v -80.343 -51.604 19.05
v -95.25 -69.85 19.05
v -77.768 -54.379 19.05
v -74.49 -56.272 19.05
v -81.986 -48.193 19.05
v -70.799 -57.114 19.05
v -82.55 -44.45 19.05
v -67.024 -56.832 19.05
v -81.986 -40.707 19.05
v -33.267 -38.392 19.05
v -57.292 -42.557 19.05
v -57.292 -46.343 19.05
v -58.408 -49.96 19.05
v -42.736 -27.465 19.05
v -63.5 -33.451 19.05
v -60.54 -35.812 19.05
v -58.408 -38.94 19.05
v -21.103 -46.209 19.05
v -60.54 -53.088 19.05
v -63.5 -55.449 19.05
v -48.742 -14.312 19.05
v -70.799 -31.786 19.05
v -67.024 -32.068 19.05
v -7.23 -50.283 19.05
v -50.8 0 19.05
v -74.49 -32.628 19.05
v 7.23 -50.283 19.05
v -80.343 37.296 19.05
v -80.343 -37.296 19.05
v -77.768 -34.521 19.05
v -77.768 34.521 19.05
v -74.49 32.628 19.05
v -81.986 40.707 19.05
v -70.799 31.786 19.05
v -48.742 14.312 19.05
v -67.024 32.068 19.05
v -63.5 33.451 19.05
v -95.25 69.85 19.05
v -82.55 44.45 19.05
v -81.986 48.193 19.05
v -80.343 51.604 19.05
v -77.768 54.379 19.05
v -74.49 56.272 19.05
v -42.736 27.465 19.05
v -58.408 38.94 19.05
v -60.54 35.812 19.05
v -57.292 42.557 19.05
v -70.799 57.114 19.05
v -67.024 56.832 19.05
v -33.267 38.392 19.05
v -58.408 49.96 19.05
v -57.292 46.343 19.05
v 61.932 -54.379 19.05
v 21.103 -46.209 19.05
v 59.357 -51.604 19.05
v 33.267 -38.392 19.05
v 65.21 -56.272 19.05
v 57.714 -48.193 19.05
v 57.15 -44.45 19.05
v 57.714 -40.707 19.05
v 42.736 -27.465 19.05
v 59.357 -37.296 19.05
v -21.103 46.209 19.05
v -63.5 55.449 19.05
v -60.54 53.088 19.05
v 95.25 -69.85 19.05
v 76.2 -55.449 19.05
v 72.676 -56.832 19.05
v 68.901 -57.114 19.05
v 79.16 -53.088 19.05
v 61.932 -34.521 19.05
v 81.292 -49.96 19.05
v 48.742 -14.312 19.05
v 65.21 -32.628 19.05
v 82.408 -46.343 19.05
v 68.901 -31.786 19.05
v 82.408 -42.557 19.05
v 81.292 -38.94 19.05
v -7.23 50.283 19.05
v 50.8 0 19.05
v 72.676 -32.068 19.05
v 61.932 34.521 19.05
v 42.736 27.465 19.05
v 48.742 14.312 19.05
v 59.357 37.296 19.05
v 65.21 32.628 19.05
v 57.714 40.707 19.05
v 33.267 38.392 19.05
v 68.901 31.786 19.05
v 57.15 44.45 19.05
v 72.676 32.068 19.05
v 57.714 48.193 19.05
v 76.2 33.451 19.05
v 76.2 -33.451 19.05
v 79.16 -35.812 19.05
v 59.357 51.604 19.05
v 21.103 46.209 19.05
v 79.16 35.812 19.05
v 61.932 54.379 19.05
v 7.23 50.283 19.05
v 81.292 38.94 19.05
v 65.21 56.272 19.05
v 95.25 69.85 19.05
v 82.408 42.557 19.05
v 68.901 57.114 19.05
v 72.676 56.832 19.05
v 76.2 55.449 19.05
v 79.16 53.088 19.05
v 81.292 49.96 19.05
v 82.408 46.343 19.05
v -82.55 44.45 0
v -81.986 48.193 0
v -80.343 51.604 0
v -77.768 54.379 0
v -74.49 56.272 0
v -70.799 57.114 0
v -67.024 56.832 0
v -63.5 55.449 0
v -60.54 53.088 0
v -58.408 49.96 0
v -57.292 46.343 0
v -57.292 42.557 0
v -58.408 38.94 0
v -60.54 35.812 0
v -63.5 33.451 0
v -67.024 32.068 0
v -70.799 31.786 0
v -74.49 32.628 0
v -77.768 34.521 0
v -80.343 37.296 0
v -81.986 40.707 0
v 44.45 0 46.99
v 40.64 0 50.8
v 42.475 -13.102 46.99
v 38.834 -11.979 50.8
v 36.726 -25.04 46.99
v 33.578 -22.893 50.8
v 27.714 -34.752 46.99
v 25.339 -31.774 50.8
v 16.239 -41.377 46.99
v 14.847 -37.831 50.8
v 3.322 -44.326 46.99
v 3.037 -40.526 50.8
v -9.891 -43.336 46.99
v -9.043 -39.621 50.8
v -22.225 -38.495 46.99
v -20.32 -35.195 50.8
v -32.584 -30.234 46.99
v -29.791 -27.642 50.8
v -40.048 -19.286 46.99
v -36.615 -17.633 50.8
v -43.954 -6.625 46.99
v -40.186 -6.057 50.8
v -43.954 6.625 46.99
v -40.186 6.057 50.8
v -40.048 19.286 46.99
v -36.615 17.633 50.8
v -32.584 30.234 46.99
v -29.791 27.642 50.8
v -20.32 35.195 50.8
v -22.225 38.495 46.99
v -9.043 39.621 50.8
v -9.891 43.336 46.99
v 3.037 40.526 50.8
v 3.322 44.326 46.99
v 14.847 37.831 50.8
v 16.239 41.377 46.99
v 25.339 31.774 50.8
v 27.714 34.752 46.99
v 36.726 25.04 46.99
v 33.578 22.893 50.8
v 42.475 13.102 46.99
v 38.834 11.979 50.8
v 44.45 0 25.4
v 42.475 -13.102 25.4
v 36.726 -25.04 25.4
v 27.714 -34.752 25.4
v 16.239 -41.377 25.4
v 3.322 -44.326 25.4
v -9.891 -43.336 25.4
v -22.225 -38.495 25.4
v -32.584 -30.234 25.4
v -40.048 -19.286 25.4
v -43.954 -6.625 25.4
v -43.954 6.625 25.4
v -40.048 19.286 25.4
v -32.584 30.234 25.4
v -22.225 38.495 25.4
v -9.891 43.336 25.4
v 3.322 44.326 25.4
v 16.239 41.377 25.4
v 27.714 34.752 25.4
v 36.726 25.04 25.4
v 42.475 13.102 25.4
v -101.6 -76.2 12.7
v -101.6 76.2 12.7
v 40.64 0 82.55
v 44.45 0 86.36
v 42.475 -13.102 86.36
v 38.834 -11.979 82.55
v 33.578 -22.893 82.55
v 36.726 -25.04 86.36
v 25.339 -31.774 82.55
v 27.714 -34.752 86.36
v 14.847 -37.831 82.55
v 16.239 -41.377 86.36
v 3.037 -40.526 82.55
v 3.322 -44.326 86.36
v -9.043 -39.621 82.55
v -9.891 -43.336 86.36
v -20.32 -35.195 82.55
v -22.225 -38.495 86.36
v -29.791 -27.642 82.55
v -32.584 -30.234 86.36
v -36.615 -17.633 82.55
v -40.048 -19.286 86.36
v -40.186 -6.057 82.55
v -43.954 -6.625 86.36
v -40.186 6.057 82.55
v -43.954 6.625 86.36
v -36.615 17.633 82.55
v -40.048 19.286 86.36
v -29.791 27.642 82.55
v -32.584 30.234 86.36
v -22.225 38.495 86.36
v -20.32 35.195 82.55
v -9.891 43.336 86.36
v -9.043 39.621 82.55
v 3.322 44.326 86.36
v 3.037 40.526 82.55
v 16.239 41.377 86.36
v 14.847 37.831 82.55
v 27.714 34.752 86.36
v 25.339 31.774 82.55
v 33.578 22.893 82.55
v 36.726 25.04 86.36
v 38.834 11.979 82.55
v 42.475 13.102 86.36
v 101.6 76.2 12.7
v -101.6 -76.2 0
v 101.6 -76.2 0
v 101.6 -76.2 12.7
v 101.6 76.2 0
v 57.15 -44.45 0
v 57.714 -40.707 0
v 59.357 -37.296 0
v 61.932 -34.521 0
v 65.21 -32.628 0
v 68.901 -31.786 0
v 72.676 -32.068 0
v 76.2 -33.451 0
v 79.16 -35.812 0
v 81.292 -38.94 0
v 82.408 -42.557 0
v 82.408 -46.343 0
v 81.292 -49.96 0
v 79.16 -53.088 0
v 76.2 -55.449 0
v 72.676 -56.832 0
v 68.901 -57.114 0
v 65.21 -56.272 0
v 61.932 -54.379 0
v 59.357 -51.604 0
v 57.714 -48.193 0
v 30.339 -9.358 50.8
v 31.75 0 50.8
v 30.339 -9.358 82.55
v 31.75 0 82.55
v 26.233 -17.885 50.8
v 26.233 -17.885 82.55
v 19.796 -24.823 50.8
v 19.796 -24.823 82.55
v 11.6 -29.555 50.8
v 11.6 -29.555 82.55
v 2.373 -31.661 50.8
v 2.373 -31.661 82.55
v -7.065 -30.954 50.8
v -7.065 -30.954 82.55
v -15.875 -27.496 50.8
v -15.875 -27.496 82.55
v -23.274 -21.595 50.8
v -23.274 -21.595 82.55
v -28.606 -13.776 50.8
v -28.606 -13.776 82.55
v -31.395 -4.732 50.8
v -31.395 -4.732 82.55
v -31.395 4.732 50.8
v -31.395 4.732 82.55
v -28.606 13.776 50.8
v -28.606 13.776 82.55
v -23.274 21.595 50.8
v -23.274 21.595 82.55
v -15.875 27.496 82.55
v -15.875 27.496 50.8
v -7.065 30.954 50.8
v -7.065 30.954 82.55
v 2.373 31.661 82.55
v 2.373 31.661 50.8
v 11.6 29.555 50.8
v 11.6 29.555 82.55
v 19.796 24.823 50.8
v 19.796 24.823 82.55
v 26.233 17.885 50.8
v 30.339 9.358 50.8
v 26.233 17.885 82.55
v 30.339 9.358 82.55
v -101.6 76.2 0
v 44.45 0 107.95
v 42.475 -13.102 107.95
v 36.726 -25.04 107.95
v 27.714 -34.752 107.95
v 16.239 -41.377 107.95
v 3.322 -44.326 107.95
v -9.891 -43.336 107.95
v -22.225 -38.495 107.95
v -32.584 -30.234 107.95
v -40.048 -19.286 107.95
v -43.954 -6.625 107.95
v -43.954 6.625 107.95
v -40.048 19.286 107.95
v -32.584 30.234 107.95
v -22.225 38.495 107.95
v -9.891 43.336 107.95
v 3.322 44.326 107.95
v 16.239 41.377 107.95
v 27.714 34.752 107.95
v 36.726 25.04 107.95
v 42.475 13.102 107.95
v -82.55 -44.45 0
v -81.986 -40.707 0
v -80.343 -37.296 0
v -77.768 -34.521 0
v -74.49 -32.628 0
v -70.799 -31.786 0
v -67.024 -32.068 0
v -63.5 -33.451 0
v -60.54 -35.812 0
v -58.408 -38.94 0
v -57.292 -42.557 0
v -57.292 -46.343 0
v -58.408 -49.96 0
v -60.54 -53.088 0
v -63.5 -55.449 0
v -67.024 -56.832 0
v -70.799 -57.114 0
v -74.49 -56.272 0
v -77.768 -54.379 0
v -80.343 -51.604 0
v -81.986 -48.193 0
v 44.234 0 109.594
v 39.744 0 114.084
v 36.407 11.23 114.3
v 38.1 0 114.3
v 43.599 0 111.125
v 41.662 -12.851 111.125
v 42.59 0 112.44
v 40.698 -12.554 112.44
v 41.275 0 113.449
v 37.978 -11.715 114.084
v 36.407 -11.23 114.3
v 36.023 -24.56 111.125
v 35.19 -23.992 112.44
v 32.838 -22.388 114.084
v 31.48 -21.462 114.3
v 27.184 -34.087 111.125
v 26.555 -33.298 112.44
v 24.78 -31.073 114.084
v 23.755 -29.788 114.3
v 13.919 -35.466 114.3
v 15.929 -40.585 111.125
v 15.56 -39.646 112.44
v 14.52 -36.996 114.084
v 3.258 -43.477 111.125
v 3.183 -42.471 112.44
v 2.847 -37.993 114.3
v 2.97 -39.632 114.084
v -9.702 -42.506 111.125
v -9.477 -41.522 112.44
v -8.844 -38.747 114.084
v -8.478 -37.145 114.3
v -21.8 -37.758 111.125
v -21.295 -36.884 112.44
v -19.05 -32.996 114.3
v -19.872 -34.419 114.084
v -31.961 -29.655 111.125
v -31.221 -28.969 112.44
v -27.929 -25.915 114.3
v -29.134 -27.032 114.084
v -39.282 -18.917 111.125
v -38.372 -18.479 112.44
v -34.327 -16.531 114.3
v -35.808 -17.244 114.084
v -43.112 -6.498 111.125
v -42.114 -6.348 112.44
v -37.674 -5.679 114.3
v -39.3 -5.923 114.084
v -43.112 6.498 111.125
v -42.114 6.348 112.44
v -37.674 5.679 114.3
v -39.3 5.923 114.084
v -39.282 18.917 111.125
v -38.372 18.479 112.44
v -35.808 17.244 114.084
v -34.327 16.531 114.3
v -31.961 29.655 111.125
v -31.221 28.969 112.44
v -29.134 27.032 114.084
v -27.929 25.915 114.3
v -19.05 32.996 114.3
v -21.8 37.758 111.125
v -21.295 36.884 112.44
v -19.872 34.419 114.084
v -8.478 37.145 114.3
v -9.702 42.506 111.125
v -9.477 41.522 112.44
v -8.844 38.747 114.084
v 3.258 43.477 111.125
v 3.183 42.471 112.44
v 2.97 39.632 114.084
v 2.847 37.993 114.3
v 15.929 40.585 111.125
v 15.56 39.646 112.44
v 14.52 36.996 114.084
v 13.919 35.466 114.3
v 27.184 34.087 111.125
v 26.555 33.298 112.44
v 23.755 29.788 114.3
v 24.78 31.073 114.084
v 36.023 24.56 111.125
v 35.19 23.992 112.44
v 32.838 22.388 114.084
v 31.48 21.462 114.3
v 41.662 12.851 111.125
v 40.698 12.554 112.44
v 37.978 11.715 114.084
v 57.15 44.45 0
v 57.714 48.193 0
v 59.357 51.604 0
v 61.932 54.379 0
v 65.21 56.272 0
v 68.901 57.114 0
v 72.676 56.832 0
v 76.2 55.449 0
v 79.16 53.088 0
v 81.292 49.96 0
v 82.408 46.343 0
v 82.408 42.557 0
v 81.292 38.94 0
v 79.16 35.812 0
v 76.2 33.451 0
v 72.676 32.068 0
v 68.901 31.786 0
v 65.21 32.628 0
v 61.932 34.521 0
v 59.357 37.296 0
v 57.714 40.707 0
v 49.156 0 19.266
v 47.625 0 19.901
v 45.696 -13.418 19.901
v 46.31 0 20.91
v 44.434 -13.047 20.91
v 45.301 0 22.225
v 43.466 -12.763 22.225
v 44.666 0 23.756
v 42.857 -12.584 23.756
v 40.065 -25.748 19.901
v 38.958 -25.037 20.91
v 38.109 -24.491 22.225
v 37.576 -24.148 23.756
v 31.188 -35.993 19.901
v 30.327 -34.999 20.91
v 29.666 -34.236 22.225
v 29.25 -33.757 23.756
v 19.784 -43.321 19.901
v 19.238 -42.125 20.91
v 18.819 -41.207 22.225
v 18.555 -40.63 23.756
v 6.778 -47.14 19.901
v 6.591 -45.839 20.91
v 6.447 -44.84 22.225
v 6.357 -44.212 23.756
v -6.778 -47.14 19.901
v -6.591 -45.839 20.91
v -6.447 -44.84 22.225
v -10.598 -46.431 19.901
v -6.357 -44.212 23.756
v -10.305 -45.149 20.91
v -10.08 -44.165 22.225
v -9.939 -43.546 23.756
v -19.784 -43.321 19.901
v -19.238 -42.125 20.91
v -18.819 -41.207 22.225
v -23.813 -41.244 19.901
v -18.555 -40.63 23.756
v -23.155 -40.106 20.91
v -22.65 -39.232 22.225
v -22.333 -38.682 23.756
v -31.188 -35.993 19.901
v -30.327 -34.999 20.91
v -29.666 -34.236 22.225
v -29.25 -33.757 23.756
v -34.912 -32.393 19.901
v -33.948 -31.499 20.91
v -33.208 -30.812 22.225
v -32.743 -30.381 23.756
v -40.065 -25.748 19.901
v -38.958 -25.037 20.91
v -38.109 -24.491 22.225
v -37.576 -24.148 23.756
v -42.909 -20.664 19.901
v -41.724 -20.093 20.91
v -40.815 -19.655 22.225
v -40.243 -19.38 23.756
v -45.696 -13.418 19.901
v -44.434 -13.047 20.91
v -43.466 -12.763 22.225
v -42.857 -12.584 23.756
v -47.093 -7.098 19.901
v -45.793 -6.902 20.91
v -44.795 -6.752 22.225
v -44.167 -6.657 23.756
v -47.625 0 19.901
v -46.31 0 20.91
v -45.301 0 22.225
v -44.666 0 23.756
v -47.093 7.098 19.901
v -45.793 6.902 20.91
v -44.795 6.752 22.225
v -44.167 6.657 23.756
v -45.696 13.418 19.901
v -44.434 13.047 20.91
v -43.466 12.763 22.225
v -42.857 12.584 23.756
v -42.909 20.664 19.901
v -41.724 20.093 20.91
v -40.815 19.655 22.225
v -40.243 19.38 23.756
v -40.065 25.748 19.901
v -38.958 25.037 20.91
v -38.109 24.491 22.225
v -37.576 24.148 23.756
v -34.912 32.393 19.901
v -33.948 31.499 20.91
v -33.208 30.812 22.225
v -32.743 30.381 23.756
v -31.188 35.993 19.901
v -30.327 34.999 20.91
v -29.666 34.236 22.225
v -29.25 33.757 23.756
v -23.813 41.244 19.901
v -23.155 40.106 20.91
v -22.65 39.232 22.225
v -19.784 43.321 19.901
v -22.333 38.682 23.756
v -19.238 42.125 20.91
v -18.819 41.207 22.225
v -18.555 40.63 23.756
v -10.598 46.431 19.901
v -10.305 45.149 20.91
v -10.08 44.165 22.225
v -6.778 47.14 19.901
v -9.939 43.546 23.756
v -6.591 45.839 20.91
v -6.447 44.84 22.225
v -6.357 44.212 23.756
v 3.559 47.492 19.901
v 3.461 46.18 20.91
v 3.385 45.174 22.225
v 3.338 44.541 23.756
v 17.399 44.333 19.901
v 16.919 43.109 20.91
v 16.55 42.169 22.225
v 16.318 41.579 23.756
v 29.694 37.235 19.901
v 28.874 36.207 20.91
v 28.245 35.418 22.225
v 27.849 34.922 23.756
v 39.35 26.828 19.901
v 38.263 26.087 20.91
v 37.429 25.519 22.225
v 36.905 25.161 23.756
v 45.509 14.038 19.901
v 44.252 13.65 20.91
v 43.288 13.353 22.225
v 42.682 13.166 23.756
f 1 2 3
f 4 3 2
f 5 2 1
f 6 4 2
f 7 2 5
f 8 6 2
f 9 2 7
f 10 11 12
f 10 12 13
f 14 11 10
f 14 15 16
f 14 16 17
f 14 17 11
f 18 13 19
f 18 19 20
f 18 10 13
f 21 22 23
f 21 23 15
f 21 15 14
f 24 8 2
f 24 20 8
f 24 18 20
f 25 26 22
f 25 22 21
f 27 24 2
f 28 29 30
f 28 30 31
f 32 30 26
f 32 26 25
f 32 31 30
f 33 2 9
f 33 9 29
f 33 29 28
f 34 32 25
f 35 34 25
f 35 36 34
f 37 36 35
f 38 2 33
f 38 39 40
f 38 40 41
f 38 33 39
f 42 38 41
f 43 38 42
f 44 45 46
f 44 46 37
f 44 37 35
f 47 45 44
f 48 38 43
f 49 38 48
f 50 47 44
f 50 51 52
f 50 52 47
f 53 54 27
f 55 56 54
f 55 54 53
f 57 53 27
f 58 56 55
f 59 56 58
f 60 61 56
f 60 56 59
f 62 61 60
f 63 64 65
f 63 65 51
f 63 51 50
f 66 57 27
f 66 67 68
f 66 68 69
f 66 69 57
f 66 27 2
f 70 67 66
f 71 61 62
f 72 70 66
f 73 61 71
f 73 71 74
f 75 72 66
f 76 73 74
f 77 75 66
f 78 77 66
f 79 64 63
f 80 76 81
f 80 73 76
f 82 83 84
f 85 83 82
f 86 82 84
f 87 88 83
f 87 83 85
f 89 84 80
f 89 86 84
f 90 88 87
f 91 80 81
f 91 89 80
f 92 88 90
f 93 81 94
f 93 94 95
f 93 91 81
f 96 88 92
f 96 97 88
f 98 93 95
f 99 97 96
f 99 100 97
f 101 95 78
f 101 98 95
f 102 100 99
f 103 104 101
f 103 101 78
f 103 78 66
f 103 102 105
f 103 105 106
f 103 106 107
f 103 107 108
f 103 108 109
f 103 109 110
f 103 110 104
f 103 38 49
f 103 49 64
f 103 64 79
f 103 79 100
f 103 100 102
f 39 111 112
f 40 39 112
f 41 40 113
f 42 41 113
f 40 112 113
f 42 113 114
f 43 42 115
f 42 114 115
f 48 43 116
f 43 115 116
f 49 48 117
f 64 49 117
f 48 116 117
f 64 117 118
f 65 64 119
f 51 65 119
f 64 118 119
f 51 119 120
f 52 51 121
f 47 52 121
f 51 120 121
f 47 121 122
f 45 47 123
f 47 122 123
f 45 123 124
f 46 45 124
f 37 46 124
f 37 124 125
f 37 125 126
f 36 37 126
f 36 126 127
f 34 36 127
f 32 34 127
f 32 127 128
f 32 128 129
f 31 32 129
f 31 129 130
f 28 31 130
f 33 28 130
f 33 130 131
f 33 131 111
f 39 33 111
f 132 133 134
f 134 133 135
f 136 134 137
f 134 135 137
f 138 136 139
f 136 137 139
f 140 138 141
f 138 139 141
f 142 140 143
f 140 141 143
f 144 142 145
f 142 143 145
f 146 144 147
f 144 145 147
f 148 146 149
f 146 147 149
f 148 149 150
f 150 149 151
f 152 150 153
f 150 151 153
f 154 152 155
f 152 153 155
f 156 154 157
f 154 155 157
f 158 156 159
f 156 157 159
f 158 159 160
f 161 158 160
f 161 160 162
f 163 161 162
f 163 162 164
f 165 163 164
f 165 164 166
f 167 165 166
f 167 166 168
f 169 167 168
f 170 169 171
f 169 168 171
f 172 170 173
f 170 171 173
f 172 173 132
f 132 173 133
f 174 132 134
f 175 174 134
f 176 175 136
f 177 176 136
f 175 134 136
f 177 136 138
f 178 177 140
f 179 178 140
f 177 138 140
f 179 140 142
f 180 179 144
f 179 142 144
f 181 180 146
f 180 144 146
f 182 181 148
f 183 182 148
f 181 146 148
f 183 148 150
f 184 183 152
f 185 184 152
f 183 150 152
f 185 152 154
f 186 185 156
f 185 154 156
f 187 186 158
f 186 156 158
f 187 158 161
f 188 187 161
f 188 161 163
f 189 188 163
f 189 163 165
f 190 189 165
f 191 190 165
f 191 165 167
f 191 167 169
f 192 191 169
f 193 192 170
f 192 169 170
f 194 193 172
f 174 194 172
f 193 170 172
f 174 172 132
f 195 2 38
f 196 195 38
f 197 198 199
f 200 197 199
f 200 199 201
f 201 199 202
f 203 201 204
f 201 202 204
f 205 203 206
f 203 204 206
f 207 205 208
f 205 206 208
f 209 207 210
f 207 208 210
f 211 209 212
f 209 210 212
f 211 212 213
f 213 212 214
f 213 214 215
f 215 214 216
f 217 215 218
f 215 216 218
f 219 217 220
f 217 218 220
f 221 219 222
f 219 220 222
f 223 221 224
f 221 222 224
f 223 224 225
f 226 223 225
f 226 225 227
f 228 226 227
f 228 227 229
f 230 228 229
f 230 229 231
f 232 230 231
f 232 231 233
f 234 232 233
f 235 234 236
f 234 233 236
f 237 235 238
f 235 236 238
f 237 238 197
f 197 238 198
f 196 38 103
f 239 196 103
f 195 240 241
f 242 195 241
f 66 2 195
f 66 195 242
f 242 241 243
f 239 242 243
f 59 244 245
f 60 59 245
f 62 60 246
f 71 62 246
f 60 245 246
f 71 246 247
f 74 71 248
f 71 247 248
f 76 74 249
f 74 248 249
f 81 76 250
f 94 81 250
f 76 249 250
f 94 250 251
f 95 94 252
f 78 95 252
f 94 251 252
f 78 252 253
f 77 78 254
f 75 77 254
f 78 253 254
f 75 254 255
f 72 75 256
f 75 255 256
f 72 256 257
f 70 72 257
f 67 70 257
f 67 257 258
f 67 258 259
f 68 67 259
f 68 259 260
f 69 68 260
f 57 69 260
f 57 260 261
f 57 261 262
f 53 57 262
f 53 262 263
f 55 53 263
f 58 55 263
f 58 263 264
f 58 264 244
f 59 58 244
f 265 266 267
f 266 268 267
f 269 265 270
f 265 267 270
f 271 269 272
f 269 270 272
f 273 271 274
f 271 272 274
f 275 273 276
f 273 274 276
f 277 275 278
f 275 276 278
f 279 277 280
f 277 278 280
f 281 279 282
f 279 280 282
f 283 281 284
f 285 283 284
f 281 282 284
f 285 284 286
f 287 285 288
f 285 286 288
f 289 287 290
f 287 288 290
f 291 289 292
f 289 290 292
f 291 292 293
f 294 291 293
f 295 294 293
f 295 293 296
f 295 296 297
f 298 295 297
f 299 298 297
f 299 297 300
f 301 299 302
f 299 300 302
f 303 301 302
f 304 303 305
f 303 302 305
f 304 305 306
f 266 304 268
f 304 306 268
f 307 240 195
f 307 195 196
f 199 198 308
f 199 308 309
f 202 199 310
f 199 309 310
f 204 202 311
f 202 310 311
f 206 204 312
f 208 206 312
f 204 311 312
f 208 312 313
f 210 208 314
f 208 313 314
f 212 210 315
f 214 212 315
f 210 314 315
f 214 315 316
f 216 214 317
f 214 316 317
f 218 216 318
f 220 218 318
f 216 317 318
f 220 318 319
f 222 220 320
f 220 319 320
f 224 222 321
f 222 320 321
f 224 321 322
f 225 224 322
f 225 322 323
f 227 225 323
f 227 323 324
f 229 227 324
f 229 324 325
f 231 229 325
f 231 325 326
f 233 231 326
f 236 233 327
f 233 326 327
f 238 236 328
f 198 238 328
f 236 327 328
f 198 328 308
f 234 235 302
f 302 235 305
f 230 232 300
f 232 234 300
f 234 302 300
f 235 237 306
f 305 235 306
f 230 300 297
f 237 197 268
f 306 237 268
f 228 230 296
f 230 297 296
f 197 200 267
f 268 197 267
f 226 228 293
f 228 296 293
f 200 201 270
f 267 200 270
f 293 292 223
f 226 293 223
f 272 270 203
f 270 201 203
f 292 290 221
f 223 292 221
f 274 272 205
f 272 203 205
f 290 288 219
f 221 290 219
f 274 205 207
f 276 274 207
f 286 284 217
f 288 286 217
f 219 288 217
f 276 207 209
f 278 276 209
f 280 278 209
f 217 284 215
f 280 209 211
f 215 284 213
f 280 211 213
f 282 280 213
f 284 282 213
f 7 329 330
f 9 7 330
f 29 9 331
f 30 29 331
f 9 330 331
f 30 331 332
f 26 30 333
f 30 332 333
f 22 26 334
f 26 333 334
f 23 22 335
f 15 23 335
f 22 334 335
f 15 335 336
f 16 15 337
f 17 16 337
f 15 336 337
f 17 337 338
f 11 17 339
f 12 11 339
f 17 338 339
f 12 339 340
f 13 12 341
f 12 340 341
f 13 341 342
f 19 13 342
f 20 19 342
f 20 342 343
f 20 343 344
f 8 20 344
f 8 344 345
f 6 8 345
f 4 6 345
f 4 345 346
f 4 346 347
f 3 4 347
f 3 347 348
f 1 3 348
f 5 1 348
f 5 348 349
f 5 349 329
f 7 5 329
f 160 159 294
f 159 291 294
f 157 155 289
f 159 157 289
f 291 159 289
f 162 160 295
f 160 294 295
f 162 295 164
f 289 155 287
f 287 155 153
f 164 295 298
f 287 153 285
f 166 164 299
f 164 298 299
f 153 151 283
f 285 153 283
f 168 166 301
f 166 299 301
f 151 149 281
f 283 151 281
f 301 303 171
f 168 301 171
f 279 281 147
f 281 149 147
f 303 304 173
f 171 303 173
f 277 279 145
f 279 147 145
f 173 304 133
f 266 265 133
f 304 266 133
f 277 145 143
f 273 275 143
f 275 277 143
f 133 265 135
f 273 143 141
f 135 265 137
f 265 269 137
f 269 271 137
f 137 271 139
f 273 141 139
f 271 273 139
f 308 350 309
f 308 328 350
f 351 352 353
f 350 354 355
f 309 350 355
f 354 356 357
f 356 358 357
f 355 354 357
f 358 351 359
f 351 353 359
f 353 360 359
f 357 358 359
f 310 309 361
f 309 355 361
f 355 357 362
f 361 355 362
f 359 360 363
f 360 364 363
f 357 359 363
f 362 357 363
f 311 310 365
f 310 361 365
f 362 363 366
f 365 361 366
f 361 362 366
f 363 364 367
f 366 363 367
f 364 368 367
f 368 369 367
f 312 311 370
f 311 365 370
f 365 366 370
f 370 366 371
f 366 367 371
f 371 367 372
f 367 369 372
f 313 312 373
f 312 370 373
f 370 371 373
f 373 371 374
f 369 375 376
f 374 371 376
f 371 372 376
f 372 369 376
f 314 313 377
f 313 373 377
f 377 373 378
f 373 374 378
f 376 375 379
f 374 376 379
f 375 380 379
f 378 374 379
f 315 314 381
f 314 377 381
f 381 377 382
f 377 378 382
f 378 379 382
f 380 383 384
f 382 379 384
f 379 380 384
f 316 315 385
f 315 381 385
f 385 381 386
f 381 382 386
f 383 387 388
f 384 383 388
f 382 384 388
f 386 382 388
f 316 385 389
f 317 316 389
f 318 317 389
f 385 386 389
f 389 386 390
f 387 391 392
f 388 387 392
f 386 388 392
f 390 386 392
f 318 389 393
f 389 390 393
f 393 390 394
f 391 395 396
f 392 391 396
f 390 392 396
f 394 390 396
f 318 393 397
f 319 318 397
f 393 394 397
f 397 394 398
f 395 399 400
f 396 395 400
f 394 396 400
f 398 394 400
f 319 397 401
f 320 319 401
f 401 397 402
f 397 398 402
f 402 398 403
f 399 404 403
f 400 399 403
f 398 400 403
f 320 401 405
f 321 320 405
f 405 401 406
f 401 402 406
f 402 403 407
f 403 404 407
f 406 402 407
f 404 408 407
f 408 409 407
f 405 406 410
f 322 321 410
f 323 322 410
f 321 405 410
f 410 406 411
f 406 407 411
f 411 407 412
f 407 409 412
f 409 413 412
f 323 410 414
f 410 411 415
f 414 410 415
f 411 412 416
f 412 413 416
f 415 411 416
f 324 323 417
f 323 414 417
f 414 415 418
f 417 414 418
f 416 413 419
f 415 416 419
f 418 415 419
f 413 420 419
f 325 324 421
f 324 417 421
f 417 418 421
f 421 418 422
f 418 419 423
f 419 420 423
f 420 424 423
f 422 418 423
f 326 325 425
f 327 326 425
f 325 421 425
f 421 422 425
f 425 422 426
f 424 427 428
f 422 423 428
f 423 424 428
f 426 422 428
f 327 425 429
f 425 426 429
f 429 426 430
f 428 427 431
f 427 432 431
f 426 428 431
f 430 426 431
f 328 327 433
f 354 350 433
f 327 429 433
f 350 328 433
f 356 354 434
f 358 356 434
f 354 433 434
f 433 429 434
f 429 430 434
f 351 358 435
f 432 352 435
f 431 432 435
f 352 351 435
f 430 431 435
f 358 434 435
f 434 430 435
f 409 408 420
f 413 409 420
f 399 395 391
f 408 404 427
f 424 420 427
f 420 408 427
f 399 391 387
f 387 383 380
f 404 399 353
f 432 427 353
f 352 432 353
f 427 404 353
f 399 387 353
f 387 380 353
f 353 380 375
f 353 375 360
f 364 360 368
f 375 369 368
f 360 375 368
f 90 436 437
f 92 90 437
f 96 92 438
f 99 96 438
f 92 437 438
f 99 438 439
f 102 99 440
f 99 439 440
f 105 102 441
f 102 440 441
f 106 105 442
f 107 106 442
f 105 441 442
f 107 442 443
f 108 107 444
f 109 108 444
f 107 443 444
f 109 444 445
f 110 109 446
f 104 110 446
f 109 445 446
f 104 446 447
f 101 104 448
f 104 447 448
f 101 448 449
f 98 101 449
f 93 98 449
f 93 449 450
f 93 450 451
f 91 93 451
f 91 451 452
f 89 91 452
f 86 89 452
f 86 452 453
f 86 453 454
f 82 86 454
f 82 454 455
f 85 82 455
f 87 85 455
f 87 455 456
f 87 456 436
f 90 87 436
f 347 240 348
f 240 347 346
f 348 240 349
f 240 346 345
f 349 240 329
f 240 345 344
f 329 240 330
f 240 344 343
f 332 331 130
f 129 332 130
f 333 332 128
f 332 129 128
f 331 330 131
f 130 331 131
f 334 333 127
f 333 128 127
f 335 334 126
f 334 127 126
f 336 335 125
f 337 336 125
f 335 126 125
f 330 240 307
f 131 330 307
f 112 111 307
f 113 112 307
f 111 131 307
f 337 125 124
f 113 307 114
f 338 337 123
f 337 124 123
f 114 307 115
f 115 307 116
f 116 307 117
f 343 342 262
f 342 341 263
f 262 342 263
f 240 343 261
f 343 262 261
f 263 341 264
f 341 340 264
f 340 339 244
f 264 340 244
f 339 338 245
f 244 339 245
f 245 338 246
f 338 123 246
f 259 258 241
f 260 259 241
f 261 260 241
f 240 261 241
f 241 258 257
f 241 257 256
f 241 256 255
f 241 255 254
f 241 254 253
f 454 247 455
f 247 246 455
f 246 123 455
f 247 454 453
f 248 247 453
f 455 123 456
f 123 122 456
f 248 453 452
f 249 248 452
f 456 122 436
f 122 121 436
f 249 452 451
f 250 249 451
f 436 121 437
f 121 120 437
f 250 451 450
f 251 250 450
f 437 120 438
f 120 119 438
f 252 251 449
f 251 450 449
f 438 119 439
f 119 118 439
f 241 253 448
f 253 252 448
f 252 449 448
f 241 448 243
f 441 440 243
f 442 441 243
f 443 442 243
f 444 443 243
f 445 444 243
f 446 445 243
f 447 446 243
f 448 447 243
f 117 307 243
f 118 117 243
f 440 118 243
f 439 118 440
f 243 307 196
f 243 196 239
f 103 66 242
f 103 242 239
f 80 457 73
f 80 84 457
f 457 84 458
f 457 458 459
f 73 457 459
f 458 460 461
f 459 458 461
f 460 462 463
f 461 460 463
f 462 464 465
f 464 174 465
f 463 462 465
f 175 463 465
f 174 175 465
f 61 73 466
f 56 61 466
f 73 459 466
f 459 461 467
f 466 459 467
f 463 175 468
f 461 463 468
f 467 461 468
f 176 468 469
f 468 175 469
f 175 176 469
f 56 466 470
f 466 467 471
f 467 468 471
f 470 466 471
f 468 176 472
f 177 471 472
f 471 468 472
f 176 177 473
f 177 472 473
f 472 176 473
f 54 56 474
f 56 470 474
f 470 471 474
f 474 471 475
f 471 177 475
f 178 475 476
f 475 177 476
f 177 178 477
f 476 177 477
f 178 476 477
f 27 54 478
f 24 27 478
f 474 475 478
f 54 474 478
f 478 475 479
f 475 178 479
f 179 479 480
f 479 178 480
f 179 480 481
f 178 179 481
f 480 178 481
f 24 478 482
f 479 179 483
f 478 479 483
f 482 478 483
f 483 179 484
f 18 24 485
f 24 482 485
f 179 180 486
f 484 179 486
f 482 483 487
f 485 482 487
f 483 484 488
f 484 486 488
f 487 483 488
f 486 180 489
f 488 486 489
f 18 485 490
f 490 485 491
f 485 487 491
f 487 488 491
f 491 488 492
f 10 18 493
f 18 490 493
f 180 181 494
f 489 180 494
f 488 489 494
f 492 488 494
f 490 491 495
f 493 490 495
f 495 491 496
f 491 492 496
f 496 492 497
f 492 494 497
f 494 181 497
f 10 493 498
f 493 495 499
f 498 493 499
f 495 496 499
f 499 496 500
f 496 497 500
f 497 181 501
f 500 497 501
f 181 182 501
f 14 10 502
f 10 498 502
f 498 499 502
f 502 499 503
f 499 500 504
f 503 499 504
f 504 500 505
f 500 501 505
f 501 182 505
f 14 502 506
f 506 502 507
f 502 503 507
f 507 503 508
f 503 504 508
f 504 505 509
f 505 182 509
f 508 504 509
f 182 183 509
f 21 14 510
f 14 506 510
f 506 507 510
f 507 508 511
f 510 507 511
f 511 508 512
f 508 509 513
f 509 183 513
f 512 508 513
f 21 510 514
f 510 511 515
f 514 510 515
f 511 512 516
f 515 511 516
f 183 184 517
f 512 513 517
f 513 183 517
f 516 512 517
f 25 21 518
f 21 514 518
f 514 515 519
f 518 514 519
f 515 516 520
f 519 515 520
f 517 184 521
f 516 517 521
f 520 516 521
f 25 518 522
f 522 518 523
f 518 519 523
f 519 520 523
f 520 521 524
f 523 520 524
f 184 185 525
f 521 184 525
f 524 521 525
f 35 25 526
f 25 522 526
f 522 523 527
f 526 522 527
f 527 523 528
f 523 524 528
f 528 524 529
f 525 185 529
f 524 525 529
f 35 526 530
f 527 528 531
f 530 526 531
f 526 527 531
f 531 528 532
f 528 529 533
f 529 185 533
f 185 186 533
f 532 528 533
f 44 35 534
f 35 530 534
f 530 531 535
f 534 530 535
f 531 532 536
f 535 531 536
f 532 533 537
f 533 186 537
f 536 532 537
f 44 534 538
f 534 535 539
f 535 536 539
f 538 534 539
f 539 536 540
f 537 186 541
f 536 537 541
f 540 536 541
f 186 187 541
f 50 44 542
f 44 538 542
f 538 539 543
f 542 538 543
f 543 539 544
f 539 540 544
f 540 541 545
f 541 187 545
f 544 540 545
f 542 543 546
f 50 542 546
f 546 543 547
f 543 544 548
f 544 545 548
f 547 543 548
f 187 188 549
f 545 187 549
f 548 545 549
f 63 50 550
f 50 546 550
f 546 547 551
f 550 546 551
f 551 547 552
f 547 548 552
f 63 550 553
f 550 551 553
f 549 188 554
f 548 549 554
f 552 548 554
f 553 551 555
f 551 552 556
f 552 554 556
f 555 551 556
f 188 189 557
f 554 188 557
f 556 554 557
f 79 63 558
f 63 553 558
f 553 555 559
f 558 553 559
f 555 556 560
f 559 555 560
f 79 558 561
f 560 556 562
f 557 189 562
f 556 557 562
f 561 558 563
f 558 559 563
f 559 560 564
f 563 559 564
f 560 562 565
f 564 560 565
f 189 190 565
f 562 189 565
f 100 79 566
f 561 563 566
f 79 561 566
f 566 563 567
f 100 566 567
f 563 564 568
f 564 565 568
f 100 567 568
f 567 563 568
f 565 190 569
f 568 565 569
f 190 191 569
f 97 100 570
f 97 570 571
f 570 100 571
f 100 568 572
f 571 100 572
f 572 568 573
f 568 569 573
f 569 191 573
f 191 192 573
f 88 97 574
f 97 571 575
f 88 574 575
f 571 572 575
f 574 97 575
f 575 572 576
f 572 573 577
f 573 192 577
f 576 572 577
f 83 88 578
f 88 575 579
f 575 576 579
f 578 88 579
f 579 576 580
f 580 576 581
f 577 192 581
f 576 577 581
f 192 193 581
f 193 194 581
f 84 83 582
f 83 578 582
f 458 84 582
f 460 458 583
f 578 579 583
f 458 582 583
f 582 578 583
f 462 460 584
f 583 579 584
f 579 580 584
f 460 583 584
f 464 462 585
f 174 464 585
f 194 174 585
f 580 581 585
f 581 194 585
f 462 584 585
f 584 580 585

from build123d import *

# Parameters (mm, degrees)
F0_W     = 203.2
F0_H     = 152.4
F1_DEPTH = 19.05
F2_SIZE  = 6.35
F4_D     = 25.4
F5_W     = 31.75
F5_H     = 31.75
F7_R     = 6.35
F8_SIZE  = 3.81


with BuildPart() as f1:
    # F0 (on Top) → F1 (new body)
    with BuildSketch(Plane.XY):
        Rectangle(F0_W, F0_H)
    extrude(amount=F1_DEPTH)

    # F2
    f2_edges = [f1.edges().sort_by_distance(p)[0] for p in [
        (0, -76.2, 19.05),
        (101.6, 0, 19.05),
        (-101.6, 0, 19.05),
        (0, 76.2, 19.05),
    ]]
    chamfer(f2_edges, length=F2_SIZE)

    # F4 (through all)
    with Locations(Plane.XY.offset(19.05)):
        with Locations((-69.85, 44.45), (69.85, 44.45), (69.85, -44.45), (-69.85, -44.45)):
            Hole(F4_D / 2)

    # F5 (on Front) → F6 (revolve)
    with BuildSketch(Plane.XZ):
        Polygon((0, 114.3), (0, 82.55), (31.75, 82.55), (44.45, 82.55), (44.45, 114.3), align=None)
        with Locations((15.875, 66.675)):
            Rectangle(F5_W, F5_H)
        Polygon((31.75, 50.8), (0, 50.8), (0, 19.05), (44.45, 19.05), (44.45, 50.8), align=None)
    revolve(axis=Axis((0, 0, 34.925), (0, 0, -1)))

    # F7
    f7_edges = [f1.edges().sort_by_distance(p)[0] for p in [
        (-44.45, 0, 114.3),
        (-44.45, 0, 19.05),
    ]]
    fillet(f7_edges, radius=F7_R)

    # F8
    f8_edges = [f1.edges().sort_by_distance(p)[0] for p in [
        (-44.45, 0, 50.8),
        (-44.45, 0, 82.55),
    ]]
    chamfer(f8_edges, length=F8_SIZE)


solid = f1.part
